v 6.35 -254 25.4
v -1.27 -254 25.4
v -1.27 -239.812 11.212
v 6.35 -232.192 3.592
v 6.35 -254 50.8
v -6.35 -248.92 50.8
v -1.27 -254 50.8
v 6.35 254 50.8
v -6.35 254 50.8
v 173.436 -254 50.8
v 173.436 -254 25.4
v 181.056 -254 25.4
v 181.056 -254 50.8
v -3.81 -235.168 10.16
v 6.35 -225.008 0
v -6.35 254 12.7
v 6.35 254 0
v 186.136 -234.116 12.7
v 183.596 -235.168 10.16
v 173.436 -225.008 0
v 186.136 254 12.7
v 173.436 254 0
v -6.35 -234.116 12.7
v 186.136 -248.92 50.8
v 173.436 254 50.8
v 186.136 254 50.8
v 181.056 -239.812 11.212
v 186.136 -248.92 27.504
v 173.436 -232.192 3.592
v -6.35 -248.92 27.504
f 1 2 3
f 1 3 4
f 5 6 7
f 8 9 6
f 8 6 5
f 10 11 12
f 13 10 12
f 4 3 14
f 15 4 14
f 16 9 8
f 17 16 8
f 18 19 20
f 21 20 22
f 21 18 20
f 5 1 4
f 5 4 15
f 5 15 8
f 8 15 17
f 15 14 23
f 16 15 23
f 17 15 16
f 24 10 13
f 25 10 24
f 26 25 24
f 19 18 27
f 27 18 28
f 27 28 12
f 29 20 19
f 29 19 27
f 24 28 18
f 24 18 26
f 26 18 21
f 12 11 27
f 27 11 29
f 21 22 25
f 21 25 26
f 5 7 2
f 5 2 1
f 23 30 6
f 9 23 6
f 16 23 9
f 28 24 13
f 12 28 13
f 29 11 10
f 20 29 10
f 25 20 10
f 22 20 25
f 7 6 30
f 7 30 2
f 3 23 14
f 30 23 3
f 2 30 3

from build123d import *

# Parameters (mm, degrees)
F0_W          = 12.7
F0_H          = 508
F1_DEPTH      = 50.8
F2_SIZE       = 25.4
F4_DEPTH      = 50.8
F5_SIZE       = 25.4
F6_SIZE       = 12.69999
F6_2_SIZE     = 12.69999
F7_T1_DEPTH   = 51.5282991577
F7_T3_DEPTH   = 44.088825542
F7_T5_DEPTH   = 11.4662899398
F7_T7_DEPTH   = 37.54990514
F7_2_T1_DEPTH = 51.5282991577
F7_2_T3_DEPTH = 44.088825542
F7_2_T5_DEPTH = 37.54990514
F7_2_T7_DEPTH = 11.4662899398


# Not quite as in the source:
# - a fillet or chamfer that OpenCascade refuses, or shapes differently, is made with other operations: its cross-section is extruded or revolved along the edge and cut away or added
# - a fillet or chamfer is up to 0.001 mm smaller than in the source, because OpenCascade refuses the exact size
# - a feature of the source that left no trace in its solid (it failed there, or was rolled back) is left out


with BuildPart() as f1:
    # F0 (on Top) → F1 (new body)
    with BuildSketch(Plane.XY):
        Rectangle(F0_W, F0_H)
    extrude(amount=F1_DEPTH)

    # F2
    f2_edges = [f1.edges().sort_by_distance(p)[0] for p in [
        (0, -254, 0),
    ]]
    chamfer(f2_edges, length=F2_SIZE)

    # F6#2 (size 12.7 in the source; OpenCascade refuses exactly that, so slightly less here)
    f6_2_edges = [f1.edges().sort_by_distance(p)[0] for p in [
        (-6.35, 12.7, 0),
    ]]
    chamfer(f6_2_edges, length=F6_2_SIZE)

    # F7: chamfer of 5.08 on 4 edges, made by hand

    # F7_s2 → F7_t1 (cut)
    with BuildSketch(Plane.XY.offset(12.3358504211)):
        Polygon((-6.35, -248.92), (-1.27, -254), (-6.35, -254), align=None)
    extrude(amount=F7_T1_DEPTH, mode=Mode.SUBTRACT)

    # F7_s4 → F7_t3 (cut)
    with BuildSketch(Plane(origin=(0, -148.9377487577, 148.9377487577), x_dir=(1, 0, 0), z_dir=(0, 0.7071067812, -0.7071067812))):
        Polygon((-6.35, 156.5646101792), (-1.27, 161.6446101792), (-6.35, 161.6446101792), align=None)
    extrude(amount=F7_T3_DEPTH, mode=Mode.SUBTRACT)

    # F7_s6 → F7_t5 (cut)
    with BuildSketch(Plane.YZ.offset(0.6168500301)):
        Polygon((-230.0878975516, 1.4878975516), (-226.4957951031, 0), (-228.6, 0), align=None)
    extrude(amount=F7_T5_DEPTH, mode=Mode.SUBTRACT)

    # F7_s8 → F7_t7 (cut)
    with BuildSketch(Plane(origin=(-91.273055587, -91.273055587, 91.273055587), x_dir=(-0.7071067812, 0.7071067812, 0), z_dir=(0.5773502692, 0.5773502692, -0.5773502692))):
        Polygon((-168.6747311687, -89.2667169543), (-163.5947311687, -89.2667169543), (-166.1347311687, -90.7331866381), align=None)
    extrude(amount=F7_T7_DEPTH, mode=Mode.SUBTRACT)


with BuildPart() as f4:
    # F0 (on Top) → F4 (new body)
    with BuildSketch(Plane.XY):
        with Locations((179.7861009836, 0)):
            Rectangle(F0_W, F0_H)
    extrude(amount=F4_DEPTH)

    # F5
    f5_edges = [f4.edges().sort_by_distance(p)[0] for p in [
        (179.786101, -254, 0),
    ]]
    chamfer(f5_edges, length=F5_SIZE)

    # F6 (size 12.7 in the source; OpenCascade refuses exactly that, so slightly less here)
    f6_edges = [f4.edges().sort_by_distance(p)[0] for p in [
        (186.136101, 12.7, 0),
    ]]
    chamfer(f6_edges, length=F6_SIZE)

    # F7#2: chamfer of 5.08 on 4 edges, made by hand

    # F7_2_s2 → F7_2_t1 (cut)
    with BuildSketch(Plane.XY.offset(12.3358504211)):
        Polygon((186.1361009836, -248.92), (181.0561009836, -254), (186.1361009836, -254), align=None)
    extrude(amount=F7_2_T1_DEPTH, mode=Mode.SUBTRACT)

    # F7_2_s4 → F7_2_t3 (cut)
    with BuildSketch(Plane(origin=(0, -148.9377487577, 148.9377487577), x_dir=(1, 0, 0), z_dir=(0, 0.7071067812, -0.7071067812))):
        Polygon((186.1361009836, 156.5646101792), (181.0561009836, 161.6446101792), (186.1361009836, 161.6446101792), align=None)
    extrude(amount=F7_2_T3_DEPTH, mode=Mode.SUBTRACT)

    # F7_2_s6 → F7_2_t5 (cut)
    with BuildSketch(Plane(origin=(151.2017559148, -151.2017559148, 151.2017559148), x_dir=(-0.7071067812, -0.7071067812, 0), z_dir=(-0.5773502692, 0.5773502692, -0.5773502692))):
        Polygon((36.4667600001, -162.6640853301), (41.5467600001, -162.6640853301), (39.0067600001, -164.1305550138), align=None)
    extrude(amount=F7_2_T5_DEPTH, mode=Mode.SUBTRACT)

    # F7_2_s8 → F7_2_t7 (cut)
    with BuildSketch(Plane.YZ.offset(167.7029610137)):
        Polygon((-226.4957951031, 0), (-230.0878975516, 1.4878975516), (-228.6, 0), align=None)
    extrude(amount=F7_2_T7_DEPTH, mode=Mode.SUBTRACT)


solid = Compound([f1.part, f4.part])
